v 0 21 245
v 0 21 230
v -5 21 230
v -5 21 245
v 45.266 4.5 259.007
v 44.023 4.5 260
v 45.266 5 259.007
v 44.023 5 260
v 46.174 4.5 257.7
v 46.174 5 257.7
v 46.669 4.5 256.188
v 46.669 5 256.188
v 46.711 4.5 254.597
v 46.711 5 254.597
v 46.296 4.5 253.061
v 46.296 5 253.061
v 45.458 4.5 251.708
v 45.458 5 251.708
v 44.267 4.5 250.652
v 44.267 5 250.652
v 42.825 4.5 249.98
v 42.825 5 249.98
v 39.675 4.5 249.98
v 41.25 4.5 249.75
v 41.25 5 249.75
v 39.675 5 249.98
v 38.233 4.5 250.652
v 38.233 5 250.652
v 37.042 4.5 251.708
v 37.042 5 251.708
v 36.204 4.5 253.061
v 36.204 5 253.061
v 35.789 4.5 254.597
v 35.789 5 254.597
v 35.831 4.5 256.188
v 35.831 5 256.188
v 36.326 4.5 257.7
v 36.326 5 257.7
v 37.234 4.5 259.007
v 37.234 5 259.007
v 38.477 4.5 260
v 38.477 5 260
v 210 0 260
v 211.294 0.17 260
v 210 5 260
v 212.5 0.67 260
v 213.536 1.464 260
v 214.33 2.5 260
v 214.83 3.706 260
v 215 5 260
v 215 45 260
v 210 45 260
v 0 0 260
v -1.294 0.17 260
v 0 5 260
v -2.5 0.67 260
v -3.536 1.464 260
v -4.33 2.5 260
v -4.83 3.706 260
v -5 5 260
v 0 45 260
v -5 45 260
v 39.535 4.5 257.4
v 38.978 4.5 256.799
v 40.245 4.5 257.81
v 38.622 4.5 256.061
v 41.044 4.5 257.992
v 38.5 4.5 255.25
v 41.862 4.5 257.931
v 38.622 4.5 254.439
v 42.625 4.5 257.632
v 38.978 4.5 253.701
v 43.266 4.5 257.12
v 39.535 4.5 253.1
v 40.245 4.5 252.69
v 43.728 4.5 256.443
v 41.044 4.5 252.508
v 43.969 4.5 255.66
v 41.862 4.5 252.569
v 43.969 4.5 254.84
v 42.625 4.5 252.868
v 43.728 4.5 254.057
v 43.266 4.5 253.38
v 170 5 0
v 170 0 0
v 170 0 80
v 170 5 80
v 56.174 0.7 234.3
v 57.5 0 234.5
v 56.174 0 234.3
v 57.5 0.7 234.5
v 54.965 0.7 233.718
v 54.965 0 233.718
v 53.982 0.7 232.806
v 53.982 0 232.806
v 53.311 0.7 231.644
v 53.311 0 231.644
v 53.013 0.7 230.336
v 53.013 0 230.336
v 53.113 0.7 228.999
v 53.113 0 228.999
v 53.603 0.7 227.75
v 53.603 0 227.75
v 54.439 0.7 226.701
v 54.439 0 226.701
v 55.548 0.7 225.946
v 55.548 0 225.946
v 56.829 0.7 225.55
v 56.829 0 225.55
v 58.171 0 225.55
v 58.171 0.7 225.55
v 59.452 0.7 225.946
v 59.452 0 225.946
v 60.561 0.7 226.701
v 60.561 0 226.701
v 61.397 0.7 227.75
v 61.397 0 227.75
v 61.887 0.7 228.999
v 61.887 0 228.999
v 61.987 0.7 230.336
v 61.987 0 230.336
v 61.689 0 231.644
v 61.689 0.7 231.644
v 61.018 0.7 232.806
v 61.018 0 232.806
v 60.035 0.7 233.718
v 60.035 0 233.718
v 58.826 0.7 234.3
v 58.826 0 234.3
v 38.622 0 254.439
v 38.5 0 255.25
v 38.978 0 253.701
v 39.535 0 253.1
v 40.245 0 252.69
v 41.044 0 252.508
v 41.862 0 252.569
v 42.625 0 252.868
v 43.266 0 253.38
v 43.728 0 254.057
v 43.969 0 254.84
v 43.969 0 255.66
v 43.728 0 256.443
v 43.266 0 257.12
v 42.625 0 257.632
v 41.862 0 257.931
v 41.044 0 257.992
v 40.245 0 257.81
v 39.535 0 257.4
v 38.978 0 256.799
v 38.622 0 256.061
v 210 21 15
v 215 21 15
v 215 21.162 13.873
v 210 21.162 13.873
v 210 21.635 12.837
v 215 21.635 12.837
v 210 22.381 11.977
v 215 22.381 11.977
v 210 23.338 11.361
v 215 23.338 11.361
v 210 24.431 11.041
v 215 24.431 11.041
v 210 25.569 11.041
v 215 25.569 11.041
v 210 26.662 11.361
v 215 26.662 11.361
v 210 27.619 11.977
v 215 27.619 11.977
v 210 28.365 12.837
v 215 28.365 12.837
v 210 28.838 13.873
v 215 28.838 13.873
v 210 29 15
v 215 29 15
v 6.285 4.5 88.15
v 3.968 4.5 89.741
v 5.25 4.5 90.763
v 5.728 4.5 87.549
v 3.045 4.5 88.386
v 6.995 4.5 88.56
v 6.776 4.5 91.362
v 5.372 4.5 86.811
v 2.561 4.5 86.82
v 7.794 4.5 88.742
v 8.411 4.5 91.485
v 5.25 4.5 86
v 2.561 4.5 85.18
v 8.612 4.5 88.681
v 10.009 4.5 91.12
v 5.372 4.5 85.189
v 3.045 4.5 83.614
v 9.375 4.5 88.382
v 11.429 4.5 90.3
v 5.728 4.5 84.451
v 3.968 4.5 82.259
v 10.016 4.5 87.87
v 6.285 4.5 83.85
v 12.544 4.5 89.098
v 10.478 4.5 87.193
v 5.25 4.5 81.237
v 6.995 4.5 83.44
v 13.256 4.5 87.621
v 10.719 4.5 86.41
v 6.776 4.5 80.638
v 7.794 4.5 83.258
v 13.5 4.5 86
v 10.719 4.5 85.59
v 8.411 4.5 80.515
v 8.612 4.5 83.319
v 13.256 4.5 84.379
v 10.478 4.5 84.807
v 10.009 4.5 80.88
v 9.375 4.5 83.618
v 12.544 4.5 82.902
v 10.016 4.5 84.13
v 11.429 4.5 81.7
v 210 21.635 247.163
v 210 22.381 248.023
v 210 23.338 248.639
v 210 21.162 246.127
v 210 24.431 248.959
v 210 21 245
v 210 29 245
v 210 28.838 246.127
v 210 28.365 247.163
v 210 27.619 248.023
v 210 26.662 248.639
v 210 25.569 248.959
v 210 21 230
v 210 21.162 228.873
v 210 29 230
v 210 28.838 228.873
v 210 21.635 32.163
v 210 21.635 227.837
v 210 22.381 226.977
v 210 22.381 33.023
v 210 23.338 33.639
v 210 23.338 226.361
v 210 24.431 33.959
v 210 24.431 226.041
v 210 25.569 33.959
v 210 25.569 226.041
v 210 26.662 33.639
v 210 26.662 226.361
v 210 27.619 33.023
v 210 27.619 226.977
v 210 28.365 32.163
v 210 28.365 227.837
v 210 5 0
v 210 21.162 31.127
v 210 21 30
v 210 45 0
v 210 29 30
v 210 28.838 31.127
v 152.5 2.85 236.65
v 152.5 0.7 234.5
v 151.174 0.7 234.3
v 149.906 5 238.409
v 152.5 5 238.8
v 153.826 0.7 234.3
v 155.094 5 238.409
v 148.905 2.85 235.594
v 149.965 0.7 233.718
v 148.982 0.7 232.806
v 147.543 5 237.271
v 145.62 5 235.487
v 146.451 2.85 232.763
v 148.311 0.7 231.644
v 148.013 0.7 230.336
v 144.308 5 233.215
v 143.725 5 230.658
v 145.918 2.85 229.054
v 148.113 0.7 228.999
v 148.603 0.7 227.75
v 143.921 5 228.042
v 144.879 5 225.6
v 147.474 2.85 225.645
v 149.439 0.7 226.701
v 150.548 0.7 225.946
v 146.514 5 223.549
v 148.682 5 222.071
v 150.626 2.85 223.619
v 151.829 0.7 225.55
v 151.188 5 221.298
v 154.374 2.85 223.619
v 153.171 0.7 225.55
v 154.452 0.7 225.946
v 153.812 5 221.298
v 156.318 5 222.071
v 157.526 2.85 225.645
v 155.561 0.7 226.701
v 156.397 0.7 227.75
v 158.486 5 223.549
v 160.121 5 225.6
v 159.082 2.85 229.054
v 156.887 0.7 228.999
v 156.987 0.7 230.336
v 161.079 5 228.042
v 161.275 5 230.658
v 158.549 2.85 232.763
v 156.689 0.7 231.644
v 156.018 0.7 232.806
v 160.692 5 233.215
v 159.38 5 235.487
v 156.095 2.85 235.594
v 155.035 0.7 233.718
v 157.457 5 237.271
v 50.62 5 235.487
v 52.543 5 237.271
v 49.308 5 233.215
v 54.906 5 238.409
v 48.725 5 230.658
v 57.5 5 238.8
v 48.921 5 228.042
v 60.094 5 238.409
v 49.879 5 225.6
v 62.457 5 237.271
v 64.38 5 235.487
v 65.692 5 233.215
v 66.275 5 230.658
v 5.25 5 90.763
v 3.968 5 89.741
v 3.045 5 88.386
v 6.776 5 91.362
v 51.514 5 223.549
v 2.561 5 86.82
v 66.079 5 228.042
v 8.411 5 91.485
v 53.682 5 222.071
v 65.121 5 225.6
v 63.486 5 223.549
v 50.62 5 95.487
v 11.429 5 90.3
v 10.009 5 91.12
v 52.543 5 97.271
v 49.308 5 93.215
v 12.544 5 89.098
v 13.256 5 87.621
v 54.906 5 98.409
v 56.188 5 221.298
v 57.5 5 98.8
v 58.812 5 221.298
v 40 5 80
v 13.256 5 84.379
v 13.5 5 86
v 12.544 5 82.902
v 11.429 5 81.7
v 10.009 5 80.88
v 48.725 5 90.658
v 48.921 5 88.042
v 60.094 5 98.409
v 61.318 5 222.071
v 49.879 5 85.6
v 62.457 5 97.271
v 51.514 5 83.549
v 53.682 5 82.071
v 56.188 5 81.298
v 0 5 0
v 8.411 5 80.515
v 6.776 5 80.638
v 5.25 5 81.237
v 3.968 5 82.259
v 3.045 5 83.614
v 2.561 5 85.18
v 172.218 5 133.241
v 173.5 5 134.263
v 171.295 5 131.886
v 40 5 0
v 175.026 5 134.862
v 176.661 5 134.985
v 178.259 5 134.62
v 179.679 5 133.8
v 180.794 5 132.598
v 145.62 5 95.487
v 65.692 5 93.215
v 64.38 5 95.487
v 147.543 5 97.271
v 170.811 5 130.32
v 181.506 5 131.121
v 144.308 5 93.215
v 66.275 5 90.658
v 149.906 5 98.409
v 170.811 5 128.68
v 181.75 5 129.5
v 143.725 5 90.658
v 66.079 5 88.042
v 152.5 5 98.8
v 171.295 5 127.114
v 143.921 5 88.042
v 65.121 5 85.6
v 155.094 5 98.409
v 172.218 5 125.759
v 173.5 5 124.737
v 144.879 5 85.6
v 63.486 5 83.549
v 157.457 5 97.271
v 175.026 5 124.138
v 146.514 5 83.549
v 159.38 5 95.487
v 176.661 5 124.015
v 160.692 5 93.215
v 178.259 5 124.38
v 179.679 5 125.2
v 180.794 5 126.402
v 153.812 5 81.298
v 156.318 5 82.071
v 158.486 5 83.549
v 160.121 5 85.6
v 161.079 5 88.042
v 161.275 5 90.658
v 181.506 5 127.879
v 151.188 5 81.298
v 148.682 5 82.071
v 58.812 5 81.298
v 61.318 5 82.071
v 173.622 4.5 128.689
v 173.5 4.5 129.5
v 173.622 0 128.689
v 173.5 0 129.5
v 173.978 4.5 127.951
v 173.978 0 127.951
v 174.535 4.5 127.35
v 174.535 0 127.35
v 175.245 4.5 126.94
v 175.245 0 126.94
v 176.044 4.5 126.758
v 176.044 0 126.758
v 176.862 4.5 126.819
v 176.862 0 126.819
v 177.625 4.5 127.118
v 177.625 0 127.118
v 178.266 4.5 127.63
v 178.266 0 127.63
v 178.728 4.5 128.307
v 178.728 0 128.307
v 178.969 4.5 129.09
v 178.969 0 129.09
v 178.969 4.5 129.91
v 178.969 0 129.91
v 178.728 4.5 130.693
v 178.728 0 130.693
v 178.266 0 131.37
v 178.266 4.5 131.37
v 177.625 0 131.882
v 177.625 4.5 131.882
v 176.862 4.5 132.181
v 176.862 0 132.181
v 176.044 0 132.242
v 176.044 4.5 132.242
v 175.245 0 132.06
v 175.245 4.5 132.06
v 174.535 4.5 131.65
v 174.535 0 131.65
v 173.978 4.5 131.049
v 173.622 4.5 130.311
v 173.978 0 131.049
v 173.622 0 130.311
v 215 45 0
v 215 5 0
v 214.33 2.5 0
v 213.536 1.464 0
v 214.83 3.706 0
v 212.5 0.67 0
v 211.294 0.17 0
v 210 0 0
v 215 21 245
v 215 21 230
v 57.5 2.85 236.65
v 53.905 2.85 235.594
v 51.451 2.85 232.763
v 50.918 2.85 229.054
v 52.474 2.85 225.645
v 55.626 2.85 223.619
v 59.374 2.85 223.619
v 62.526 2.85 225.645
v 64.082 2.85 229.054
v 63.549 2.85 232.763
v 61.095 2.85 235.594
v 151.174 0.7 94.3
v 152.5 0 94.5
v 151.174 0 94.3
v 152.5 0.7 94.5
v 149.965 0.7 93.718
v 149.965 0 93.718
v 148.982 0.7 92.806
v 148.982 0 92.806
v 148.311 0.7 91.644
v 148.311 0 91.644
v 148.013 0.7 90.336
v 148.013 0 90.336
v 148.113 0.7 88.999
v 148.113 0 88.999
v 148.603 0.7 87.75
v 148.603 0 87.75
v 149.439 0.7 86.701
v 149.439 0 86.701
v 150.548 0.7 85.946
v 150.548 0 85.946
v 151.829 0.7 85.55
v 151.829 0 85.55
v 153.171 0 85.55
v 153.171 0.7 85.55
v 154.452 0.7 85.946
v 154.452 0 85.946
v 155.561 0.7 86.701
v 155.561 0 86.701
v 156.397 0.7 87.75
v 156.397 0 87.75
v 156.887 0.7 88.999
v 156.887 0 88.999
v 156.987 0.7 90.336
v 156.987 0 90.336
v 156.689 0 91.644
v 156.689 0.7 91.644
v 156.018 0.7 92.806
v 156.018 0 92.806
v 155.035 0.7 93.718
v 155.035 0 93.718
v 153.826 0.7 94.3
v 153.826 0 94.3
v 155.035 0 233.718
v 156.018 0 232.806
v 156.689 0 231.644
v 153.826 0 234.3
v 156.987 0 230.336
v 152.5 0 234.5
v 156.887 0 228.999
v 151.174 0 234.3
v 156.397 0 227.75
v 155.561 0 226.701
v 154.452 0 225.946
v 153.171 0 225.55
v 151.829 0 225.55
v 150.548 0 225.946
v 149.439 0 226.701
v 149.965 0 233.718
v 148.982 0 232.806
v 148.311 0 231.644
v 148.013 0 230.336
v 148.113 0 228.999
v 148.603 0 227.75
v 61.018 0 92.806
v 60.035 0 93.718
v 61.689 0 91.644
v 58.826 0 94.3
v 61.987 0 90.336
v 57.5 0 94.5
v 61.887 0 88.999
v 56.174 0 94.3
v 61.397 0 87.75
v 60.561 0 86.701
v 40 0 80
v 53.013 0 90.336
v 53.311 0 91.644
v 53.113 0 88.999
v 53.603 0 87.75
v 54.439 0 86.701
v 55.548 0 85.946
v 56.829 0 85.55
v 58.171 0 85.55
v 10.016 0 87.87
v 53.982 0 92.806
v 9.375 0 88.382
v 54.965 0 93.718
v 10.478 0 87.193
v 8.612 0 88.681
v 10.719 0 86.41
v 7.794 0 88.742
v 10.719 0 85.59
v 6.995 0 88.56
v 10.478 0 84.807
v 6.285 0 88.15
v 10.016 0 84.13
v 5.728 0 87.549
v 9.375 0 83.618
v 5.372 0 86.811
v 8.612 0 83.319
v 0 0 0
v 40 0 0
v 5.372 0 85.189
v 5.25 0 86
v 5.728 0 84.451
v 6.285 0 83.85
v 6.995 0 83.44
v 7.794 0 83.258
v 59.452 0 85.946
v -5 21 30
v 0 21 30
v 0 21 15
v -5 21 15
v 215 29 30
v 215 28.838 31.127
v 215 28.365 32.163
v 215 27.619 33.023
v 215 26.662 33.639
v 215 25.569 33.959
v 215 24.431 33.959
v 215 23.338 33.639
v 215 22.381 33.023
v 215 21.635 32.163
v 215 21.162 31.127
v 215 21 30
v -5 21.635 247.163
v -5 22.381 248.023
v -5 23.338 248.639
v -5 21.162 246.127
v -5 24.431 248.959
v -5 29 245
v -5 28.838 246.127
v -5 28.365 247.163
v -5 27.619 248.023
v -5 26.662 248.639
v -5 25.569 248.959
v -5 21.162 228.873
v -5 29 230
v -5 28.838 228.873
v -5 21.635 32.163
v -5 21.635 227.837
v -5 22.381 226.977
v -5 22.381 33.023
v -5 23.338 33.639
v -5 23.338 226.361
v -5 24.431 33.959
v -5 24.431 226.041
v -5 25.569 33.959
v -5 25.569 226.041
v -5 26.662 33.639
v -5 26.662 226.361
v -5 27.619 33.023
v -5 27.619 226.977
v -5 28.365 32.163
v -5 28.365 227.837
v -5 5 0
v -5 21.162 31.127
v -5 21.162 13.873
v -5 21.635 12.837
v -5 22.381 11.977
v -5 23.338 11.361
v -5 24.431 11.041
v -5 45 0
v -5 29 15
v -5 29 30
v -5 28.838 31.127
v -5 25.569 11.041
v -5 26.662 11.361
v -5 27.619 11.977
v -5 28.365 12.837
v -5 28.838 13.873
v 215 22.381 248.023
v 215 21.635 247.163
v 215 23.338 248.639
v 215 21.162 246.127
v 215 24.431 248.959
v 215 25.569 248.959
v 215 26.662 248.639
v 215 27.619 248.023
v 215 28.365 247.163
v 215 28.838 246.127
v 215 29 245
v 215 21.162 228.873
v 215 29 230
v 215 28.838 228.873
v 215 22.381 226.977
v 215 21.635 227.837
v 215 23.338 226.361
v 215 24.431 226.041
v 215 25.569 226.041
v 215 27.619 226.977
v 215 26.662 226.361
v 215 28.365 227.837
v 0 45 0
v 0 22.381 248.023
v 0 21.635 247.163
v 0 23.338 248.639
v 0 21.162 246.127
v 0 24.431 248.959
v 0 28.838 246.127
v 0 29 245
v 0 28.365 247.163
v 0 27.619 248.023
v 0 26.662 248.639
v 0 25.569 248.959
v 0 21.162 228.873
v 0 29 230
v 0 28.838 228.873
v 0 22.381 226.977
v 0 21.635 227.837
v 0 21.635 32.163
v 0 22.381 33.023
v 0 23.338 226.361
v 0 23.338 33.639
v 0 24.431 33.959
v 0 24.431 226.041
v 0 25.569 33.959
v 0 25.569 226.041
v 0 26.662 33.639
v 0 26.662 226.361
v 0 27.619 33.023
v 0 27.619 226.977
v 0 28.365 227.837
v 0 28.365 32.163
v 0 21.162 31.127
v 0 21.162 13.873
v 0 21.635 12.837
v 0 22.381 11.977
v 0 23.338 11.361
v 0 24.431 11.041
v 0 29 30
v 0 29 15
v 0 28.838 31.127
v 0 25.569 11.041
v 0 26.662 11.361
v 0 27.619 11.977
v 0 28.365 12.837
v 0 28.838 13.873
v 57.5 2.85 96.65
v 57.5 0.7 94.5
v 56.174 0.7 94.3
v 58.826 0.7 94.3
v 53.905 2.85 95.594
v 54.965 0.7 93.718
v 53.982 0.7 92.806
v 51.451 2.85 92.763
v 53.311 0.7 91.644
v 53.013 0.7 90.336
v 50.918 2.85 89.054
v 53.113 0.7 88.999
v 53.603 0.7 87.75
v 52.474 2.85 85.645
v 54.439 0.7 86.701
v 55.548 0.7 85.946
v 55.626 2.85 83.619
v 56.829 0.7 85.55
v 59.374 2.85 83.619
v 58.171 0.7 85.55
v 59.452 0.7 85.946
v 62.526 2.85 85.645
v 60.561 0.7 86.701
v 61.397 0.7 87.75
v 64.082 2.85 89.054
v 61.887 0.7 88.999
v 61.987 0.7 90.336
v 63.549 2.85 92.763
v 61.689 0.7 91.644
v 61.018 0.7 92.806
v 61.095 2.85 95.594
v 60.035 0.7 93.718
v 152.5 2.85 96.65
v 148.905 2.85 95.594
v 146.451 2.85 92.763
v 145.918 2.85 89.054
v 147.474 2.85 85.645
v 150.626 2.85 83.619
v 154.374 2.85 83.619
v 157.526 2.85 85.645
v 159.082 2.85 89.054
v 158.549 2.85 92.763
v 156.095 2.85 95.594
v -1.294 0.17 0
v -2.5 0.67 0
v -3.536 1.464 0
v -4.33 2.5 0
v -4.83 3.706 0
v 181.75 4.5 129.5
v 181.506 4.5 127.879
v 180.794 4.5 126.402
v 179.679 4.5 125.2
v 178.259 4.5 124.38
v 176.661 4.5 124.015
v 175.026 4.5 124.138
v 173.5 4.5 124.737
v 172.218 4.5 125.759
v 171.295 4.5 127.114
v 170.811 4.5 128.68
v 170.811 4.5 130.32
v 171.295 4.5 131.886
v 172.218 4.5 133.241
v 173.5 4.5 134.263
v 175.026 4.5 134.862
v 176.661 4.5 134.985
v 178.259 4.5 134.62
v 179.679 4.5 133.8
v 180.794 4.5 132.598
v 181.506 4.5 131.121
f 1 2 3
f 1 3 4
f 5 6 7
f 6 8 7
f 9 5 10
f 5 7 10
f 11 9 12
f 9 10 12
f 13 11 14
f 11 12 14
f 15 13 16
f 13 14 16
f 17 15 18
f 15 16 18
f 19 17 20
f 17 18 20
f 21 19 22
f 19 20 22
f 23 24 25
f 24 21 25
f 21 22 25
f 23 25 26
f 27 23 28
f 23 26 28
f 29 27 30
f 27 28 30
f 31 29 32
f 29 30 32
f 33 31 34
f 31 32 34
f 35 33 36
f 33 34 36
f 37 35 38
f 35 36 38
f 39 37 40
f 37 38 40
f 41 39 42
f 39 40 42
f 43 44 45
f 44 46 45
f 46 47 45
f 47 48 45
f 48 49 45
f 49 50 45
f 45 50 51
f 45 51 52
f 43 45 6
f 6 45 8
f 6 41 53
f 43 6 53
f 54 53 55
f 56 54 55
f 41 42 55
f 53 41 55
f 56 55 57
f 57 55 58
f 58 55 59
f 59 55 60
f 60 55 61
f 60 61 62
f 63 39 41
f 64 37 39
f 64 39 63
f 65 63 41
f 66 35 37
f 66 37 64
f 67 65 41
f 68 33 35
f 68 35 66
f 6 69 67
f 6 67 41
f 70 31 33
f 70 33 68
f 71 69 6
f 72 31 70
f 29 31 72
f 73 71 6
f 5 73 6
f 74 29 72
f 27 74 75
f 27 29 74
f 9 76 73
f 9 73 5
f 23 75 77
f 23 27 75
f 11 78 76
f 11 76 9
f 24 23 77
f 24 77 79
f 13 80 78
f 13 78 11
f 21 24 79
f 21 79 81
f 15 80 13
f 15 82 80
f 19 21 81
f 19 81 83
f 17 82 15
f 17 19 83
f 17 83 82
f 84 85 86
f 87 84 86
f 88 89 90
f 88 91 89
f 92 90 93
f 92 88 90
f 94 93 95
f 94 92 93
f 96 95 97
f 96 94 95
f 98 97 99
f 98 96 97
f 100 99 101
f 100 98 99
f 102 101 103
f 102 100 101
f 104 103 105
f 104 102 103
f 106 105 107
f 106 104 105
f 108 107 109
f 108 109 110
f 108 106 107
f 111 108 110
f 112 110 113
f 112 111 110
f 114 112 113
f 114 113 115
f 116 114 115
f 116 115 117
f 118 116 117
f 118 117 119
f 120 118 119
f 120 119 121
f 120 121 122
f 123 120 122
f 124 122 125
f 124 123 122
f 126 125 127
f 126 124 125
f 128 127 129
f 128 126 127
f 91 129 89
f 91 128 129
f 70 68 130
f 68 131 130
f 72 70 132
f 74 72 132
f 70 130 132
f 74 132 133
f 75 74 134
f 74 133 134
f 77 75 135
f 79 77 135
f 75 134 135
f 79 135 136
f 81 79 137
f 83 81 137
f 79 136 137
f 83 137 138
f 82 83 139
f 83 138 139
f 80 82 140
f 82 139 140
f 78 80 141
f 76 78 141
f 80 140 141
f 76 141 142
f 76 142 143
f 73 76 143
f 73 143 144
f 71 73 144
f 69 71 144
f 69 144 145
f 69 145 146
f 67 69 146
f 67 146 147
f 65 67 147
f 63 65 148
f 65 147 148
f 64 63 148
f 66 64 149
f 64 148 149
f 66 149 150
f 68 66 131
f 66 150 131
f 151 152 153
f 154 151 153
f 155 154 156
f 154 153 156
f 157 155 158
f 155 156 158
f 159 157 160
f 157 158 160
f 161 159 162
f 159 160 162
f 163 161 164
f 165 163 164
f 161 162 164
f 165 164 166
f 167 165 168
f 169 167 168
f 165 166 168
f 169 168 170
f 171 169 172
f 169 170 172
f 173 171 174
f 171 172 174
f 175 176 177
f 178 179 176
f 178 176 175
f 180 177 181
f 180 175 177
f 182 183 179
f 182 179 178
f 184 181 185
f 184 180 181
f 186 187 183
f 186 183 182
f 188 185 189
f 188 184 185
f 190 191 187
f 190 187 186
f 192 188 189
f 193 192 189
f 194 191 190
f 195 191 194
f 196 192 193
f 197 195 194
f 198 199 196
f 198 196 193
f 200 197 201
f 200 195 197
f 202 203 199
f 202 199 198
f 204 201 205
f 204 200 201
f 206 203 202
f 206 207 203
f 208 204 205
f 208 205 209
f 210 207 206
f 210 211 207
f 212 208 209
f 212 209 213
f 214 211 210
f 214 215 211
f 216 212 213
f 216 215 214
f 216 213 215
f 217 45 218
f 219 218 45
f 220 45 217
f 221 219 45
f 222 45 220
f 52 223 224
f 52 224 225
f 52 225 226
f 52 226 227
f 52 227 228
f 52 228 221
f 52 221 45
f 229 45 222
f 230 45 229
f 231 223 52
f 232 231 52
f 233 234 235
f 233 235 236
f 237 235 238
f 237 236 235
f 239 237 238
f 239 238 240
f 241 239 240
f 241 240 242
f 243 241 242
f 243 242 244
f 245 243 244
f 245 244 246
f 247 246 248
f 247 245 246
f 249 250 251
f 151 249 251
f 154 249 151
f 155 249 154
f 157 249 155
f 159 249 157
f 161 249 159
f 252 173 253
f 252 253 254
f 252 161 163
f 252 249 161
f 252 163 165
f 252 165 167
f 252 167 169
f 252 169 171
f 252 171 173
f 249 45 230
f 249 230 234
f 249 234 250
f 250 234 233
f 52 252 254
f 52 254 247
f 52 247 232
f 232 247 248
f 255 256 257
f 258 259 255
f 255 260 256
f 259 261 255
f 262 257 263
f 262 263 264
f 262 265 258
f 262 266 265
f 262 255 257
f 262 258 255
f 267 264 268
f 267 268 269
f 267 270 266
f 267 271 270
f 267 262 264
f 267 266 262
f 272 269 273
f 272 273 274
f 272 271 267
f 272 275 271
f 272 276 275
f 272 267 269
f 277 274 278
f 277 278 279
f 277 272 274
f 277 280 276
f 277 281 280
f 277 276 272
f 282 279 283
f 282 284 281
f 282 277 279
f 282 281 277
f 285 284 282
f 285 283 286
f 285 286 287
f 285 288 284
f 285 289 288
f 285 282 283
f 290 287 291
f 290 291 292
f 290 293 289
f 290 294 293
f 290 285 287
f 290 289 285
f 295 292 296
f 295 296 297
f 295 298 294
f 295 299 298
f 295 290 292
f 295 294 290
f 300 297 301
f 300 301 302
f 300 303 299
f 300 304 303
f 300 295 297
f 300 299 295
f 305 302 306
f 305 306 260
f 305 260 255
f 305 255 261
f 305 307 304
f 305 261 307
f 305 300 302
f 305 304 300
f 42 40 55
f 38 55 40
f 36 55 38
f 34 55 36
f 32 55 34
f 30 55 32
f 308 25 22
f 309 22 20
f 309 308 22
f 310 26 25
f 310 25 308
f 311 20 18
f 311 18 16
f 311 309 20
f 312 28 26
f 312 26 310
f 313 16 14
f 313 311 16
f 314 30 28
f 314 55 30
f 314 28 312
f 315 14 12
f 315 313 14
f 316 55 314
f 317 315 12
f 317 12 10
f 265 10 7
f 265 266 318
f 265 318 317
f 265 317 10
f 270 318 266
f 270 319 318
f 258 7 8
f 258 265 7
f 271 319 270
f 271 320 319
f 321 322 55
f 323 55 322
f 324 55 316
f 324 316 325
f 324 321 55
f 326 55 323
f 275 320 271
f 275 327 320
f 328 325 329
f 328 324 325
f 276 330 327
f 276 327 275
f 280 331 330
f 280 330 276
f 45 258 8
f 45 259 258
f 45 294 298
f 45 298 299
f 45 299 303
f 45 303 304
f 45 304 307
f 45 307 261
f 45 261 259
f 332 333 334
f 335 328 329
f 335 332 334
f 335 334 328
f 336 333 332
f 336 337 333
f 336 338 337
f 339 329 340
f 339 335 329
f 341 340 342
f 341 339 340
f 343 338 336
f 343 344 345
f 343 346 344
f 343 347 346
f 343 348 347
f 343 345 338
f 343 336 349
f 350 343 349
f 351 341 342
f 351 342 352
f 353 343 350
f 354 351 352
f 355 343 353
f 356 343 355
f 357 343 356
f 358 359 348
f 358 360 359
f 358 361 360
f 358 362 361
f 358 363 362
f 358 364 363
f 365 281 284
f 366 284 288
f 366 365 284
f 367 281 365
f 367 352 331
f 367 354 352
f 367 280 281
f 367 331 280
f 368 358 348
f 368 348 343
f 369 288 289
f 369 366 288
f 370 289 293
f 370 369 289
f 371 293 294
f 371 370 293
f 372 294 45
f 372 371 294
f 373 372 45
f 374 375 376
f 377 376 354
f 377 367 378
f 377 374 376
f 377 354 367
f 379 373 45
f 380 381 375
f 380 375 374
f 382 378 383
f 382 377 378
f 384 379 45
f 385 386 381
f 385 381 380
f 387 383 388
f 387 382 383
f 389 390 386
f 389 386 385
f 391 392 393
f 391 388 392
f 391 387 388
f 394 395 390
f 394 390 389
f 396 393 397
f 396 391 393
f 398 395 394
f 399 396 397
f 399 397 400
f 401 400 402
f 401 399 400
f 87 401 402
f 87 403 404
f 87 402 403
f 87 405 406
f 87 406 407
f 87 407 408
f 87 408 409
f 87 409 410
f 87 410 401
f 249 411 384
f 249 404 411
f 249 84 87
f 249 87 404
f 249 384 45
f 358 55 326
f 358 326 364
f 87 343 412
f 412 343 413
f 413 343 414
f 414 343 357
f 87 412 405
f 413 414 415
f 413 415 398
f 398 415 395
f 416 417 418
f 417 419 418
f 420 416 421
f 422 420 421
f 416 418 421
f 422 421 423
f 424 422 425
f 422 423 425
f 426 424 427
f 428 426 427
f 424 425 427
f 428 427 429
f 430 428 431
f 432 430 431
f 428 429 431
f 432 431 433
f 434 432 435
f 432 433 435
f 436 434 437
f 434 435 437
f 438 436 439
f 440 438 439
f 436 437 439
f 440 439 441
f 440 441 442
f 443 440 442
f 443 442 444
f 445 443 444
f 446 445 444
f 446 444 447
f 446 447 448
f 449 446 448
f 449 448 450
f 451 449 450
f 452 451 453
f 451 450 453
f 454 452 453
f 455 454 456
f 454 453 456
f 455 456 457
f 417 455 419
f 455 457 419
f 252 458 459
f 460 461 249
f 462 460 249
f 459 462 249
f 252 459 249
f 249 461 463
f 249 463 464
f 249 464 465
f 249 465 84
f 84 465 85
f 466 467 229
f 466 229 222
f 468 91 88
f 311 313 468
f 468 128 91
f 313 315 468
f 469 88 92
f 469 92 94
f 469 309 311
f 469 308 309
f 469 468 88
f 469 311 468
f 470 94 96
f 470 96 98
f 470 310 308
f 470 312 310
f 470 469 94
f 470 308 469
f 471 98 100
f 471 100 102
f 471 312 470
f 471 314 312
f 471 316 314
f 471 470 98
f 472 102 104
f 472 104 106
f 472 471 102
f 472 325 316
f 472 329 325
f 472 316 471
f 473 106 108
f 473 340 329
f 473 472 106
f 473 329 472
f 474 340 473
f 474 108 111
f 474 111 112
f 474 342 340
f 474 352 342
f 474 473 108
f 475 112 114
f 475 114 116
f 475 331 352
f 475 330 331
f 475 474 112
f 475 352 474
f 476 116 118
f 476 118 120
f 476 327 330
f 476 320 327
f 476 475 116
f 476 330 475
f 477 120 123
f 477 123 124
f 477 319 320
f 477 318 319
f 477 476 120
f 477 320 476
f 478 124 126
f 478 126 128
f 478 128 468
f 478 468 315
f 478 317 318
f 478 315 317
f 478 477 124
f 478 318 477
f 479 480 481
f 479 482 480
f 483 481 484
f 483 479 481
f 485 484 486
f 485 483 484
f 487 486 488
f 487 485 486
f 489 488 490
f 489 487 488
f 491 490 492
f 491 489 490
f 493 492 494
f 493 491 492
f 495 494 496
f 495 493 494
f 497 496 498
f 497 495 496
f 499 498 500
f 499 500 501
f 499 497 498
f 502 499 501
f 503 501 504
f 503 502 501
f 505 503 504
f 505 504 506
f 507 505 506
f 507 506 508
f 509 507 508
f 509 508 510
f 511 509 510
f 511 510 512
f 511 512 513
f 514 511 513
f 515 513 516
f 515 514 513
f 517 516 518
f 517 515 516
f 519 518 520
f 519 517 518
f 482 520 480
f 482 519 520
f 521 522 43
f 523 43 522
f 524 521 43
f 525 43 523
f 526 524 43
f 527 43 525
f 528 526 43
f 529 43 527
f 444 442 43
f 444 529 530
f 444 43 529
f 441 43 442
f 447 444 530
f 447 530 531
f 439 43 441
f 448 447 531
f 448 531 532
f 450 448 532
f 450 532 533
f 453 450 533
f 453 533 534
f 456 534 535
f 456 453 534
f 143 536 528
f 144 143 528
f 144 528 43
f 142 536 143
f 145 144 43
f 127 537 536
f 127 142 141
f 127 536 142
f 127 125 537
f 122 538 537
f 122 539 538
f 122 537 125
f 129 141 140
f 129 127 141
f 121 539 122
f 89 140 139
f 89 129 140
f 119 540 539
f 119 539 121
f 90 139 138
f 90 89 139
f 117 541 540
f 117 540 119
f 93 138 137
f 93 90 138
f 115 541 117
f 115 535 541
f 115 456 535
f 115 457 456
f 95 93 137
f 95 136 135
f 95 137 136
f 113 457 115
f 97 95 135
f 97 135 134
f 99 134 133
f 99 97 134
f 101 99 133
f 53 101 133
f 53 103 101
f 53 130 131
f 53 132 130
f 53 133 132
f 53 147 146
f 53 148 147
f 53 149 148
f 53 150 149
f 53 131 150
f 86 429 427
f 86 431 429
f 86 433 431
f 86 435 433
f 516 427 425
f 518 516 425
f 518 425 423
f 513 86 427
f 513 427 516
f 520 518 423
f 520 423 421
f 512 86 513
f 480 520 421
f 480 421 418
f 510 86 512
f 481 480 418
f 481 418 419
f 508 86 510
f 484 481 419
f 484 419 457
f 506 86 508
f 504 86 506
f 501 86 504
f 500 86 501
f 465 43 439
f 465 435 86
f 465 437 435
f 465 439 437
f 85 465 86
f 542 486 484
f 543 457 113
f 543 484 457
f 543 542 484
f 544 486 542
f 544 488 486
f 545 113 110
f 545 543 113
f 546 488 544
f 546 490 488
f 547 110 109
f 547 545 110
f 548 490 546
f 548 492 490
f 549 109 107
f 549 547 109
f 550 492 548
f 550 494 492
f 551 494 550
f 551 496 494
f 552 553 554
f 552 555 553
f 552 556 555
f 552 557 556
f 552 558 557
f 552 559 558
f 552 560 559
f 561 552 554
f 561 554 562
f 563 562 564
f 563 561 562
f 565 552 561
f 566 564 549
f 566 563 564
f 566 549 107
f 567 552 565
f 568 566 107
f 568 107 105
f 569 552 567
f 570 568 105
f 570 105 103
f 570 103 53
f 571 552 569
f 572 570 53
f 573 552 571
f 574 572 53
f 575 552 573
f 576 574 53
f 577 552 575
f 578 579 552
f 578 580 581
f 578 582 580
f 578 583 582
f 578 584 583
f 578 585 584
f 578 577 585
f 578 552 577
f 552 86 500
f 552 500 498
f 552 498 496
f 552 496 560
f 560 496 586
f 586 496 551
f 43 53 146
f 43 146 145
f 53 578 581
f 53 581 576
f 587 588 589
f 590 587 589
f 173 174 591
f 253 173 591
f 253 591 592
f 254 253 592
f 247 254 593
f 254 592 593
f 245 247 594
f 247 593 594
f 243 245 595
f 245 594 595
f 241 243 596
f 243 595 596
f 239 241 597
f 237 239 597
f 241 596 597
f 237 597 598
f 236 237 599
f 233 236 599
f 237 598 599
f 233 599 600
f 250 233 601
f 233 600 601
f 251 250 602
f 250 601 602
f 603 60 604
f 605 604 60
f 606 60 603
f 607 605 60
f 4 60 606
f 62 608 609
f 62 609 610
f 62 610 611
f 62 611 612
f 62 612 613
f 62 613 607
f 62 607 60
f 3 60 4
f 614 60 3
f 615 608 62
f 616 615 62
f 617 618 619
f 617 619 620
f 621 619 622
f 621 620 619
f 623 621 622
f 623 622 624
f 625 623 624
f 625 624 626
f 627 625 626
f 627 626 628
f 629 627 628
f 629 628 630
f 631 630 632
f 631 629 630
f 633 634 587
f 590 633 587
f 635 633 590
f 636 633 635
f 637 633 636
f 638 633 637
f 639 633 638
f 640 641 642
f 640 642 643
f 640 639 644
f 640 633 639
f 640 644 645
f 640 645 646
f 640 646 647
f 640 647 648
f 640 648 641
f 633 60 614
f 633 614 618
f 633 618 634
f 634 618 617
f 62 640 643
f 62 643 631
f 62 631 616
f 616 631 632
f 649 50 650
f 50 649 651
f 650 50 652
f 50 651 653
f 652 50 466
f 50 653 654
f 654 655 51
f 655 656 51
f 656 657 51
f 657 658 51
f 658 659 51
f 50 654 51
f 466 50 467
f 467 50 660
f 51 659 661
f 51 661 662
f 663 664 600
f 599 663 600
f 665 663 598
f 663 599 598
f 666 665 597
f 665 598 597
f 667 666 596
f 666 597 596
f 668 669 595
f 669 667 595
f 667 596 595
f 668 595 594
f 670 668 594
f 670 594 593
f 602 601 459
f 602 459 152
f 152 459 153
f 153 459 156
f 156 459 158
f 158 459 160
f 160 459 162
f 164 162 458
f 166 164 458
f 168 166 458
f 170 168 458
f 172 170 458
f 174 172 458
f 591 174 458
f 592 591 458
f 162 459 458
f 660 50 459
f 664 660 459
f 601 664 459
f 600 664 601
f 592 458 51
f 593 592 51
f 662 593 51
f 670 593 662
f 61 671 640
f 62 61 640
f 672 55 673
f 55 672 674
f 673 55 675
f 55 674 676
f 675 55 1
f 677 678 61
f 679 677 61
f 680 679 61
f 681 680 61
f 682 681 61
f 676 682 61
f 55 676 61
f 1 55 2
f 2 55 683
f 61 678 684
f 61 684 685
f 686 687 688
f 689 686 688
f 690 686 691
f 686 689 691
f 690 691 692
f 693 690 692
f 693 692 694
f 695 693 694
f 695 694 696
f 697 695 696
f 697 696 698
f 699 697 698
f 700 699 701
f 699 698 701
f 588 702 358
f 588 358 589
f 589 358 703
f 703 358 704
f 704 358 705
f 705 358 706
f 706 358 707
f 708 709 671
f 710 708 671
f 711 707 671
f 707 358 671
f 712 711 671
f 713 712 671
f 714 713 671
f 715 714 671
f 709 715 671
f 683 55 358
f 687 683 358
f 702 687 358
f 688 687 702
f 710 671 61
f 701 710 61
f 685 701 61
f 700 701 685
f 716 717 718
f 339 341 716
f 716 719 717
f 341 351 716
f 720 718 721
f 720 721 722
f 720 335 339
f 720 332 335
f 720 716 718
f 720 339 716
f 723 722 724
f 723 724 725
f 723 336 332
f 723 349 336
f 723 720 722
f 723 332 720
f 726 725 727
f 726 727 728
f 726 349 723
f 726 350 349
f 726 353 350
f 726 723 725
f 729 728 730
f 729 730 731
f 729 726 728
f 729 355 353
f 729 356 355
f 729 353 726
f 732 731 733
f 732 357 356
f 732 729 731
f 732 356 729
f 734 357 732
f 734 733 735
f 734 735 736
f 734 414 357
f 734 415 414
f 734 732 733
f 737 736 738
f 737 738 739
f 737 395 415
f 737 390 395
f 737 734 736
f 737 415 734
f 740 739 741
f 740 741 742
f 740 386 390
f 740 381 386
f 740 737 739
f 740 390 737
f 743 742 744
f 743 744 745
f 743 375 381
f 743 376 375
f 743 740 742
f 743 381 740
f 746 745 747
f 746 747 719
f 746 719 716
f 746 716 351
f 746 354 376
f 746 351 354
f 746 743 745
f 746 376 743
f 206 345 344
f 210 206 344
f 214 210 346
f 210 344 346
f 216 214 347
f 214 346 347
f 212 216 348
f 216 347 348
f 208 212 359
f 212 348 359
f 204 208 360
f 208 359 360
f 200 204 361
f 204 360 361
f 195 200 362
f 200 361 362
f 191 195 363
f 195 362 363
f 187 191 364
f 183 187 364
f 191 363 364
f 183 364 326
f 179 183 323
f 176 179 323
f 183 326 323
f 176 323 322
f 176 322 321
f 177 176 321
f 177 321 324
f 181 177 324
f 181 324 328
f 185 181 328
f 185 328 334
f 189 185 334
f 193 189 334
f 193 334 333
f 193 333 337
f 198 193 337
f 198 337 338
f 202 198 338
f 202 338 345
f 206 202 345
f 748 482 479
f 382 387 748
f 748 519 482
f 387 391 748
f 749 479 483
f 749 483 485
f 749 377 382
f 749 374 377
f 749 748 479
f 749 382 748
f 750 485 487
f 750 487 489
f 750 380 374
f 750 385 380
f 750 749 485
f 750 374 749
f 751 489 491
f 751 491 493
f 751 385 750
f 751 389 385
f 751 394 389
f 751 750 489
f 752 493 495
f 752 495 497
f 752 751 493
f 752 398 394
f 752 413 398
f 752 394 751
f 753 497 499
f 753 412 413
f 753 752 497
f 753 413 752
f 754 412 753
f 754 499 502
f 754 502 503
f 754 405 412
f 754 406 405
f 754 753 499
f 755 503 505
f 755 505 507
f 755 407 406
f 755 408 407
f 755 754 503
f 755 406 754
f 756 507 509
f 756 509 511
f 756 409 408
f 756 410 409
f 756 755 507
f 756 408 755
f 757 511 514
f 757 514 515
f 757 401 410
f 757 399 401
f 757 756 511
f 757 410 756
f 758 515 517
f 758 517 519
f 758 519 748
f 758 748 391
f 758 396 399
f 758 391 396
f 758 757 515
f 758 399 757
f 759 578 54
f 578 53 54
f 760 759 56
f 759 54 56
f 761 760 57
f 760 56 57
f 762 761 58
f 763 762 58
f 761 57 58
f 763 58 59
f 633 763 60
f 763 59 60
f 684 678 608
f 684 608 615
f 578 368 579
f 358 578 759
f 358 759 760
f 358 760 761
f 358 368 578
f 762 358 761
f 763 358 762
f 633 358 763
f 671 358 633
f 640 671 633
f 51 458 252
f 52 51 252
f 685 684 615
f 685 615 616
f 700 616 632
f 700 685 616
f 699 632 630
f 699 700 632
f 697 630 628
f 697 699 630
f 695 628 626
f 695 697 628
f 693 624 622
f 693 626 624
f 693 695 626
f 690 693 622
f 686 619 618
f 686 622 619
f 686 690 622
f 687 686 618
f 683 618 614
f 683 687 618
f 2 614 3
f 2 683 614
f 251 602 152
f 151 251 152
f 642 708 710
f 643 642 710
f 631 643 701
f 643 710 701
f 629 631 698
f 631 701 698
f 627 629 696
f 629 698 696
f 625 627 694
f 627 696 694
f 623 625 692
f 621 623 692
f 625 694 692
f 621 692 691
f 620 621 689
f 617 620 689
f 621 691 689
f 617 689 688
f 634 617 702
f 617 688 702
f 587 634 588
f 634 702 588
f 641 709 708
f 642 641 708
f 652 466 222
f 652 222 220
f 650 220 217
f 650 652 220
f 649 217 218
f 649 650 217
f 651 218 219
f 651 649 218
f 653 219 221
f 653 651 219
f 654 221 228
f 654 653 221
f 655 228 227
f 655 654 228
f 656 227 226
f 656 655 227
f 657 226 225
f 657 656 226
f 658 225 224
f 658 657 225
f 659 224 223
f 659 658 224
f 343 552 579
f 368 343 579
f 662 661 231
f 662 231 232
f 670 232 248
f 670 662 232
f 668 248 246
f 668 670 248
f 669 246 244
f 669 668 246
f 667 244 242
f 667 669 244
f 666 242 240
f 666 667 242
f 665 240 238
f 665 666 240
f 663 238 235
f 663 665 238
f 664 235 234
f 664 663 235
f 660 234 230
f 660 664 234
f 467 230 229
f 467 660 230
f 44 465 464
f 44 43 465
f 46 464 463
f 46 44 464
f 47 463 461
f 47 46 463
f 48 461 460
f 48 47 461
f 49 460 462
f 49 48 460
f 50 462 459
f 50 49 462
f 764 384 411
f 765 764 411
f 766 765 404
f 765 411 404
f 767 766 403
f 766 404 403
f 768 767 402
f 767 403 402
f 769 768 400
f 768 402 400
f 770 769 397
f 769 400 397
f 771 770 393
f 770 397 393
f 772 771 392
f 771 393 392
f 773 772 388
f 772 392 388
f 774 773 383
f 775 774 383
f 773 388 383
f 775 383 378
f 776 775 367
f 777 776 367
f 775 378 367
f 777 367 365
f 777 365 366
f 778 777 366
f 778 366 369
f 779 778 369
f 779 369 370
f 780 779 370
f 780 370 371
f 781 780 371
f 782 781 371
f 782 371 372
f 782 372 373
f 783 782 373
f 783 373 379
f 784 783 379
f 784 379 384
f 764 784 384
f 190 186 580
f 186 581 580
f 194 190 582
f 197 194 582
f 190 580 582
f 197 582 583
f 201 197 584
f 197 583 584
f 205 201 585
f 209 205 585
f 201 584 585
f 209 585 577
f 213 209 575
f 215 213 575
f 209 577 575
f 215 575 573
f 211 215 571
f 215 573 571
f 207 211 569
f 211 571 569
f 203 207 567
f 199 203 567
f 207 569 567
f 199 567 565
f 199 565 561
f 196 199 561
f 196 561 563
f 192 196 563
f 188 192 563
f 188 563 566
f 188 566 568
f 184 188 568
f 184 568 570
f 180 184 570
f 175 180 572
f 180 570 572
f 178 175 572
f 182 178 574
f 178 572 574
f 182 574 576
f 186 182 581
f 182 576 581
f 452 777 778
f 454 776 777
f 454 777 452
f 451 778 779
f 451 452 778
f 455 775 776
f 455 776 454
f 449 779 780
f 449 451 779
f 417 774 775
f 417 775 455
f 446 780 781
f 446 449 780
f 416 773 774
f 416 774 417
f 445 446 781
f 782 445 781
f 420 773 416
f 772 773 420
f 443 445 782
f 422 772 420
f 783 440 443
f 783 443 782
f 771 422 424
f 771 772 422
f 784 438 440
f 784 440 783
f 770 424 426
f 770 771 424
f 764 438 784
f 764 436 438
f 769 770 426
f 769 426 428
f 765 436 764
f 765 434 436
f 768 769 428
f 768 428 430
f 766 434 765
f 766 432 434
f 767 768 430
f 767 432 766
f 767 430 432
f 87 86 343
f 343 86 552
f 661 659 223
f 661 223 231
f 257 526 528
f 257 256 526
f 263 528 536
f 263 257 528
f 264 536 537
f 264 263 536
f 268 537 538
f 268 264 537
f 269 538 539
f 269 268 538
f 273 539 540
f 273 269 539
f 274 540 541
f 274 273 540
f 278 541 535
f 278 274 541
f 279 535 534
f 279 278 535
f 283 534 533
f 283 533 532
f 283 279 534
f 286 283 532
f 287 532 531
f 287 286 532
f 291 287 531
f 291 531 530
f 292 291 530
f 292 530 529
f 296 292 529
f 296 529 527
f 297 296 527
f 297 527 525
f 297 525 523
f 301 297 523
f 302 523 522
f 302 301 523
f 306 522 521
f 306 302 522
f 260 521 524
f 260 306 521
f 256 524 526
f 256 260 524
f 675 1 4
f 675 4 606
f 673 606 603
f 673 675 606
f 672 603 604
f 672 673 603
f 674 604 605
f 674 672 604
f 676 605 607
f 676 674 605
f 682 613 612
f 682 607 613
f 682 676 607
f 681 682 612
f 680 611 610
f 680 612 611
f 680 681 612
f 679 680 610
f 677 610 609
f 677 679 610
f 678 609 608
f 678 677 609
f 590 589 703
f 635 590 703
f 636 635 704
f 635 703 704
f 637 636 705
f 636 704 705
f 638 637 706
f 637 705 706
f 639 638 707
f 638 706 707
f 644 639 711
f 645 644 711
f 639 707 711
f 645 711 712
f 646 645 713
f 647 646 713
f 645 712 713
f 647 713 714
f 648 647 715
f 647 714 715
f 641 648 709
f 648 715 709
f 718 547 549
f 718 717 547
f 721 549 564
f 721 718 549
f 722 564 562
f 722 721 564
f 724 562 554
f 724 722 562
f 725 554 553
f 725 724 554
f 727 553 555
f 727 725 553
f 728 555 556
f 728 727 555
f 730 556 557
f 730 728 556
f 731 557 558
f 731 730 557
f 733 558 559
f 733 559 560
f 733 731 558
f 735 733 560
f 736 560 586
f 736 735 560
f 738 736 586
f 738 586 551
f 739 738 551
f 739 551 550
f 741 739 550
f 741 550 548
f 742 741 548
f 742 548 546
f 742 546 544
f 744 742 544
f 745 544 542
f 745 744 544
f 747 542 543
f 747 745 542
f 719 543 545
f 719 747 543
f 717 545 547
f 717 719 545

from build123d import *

# Parameters (mm, degrees)
EXTRUDE_1_DEPTH              = 5
HOLE_WIZARD_M8_2_AT_2_COUNT  = 2
HOLE_WIZARD_M8_2_AT_2_PITCH  = 140
HOLE_WIZARD_M8_2_AT_3_COUNT  = 2
HOLE_WIZARD_M8_2_AT_3_PITCH  = 169.189243157
HOLE_WIZARD_M8_2_AT_4_COUNT  = 2
HOLE_WIZARD_M8_2_AT_4_PITCH  = 95
SKETCH_10_W                  = 5
SKETCH_10_H                  = 45
EXTRUDE_2_DEPTH              = 260
FILLET_1_R                   = 5
CUT_EXTRUDE_5_DEPTH          = 344.547667726
HOLE_WIZARD_M5_1_D           = 5.5
HOLE_WIZARD_M5_1_CBORE_D     = 11
HOLE_WIZARD_M5_1_CBORE_DEPTH = 0.5


with BuildPart() as part:
    # 草图1 → 凸台-拉伸1 (new body)
    with BuildSketch(Plane(origin=(0, 0, 0), x_dir=(1, 0, 0), z_dir=(0, 1, 0))):
        Polygon((0, 0), (0, -260), (210, -260), (210, 0), (170, 0), (170, -80), (40, -80), (40, 0), align=None)
    extrude(amount=EXTRUDE_1_DEPTH)

    # 草图9 → M8 内六角花形沉头螺钉的锥形沉头孔2 (revolve, cut)
    with BuildSketch(Plane(origin=(57.5, 5, 230), x_dir=(0, 0, 1), z_dir=(1, 0, 0))):
        Polygon((0, 0), (0, 5), (4.5, 5), (4.5, 4.3), (8.8, 0), align=None)
    hole_wizard_m8_2 = revolve(axis=Axis((57.5, 11.35, 230), (0, -1, 0)), mode=Mode.SUBTRACT)

    # M8 内六角花形沉头螺钉的锥形沉头孔2 at 2: M8 内六角花形沉头螺钉的锥形沉头孔2 ×2
    with Locations(*[(0, 0, -i * HOLE_WIZARD_M8_2_AT_2_PITCH) for i in range(1, HOLE_WIZARD_M8_2_AT_2_COUNT)]):
        add(hole_wizard_m8_2, mode=Mode.SUBTRACT)

    # M8 内六角花形沉头螺钉的锥形沉头孔2 at 3: M8 内六角花形沉头螺钉的锥形沉头孔2 ×2
    with Locations(*[Vector(0.5615014183372644, 0, -0.8274757743917585) * (i * HOLE_WIZARD_M8_2_AT_3_PITCH) for i in range(1, HOLE_WIZARD_M8_2_AT_3_COUNT)]):
        add(hole_wizard_m8_2, mode=Mode.SUBTRACT)

    # M8 内六角花形沉头螺钉的锥形沉头孔2 at 4: M8 内六角花形沉头螺钉的锥形沉头孔2 ×2
    with Locations(*[(i * HOLE_WIZARD_M8_2_AT_4_PITCH, 0, 0) for i in range(1, HOLE_WIZARD_M8_2_AT_4_COUNT)]):
        add(hole_wizard_m8_2, mode=Mode.SUBTRACT)

    # 草图10 → 凸台-拉伸2 (add, through all)
    with BuildSketch(Plane(origin=(0, 0, 0), x_dir=(-1, 0, 0), z_dir=(0, 0, -1))):
        with Locations((2.5, 22.5)):
            Rectangle(SKETCH_10_W, SKETCH_10_H)
        with Locations((-212.5, 22.5)):
            Rectangle(SKETCH_10_W, SKETCH_10_H)
    extrude(amount=-EXTRUDE_2_DEPTH)

    # 圆角1
    fillet_1_edges = [part.edges().sort_by_distance(p)[0] for p in [
        (-5, 0, 130),
        (215, 0, 130),
    ]]
    fillet(fillet_1_edges, radius=FILLET_1_R)

    # 草图11 → 切除-拉伸5 (cut, through all)
    with BuildSketch(Plane(origin=(215, 0, 0), x_dir=(0, 0, -1), z_dir=(1, 0, 0))):
        with BuildLine():
            Line((-15, 29), (-30, 29))
            ThreePointArc((-30, 29), (-34, 25), (-30, 21))
            Line((-30, 21), (-15, 21))
            ThreePointArc((-15, 21), (-11, 25), (-15, 29))
        make_face()
        with BuildLine():
            Line((-230, 21), (-245, 21))
            ThreePointArc((-245, 21), (-249, 25), (-245, 29))
            Line((-245, 29), (-230, 29))
            ThreePointArc((-230, 29), (-226, 25), (-230, 21))
        make_face()
    extrude(amount=-CUT_EXTRUDE_5_DEPTH, mode=Mode.SUBTRACT)

    # M5 六角头螺栓的柱形沉头孔1 (through all)
    with Locations(Plane(origin=(0, 5, 0), x_dir=(1, 0, 0), z_dir=(0, 1, 0))):
        with Locations((176.25, -129.5), (8, -86), (41.25, -255.25)):
            CounterBoreHole(HOLE_WIZARD_M5_1_D / 2, HOLE_WIZARD_M5_1_CBORE_D / 2, HOLE_WIZARD_M5_1_CBORE_DEPTH)


solid = part.part
